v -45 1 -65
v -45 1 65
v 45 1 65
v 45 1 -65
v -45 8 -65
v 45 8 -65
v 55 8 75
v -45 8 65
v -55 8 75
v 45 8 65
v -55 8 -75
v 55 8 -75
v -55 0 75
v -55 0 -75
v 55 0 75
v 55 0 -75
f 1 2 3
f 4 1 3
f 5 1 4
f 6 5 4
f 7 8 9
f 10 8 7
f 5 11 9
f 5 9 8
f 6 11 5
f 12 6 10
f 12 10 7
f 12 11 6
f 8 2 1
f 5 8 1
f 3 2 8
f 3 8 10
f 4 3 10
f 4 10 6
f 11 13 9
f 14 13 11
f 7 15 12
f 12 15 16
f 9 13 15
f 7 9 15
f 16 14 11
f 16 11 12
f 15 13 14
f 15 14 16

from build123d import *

# Parameters (mm, degrees)
SKICA1_W        = 110
SKICA1_H        = 150
SKICA1_W_2      = 90
SKICA1_H_2      = 130
VYSUNOUT1_DEPTH = 8
SKICA2_W        = 90
SKICA2_H        = 130
VYSUNOUT2_DEPTH = 1


with BuildPart() as part:
    # Skica1 → Vysunout1 (new body)
    with BuildSketch(Plane(origin=(0, 0, 0), x_dir=(1, 0, 0), z_dir=(0, 1, 0))):
        Rectangle(SKICA1_W, SKICA1_H)
        Rectangle(SKICA1_W_2, SKICA1_H_2, mode=Mode.SUBTRACT)
    extrude(amount=VYSUNOUT1_DEPTH)

    # Skica2 → Vysunout2 (add)
    with BuildSketch(Plane.XZ):
        Rectangle(SKICA2_W, SKICA2_H)
    extrude(amount=-VYSUNOUT2_DEPTH)


solid = part.part
